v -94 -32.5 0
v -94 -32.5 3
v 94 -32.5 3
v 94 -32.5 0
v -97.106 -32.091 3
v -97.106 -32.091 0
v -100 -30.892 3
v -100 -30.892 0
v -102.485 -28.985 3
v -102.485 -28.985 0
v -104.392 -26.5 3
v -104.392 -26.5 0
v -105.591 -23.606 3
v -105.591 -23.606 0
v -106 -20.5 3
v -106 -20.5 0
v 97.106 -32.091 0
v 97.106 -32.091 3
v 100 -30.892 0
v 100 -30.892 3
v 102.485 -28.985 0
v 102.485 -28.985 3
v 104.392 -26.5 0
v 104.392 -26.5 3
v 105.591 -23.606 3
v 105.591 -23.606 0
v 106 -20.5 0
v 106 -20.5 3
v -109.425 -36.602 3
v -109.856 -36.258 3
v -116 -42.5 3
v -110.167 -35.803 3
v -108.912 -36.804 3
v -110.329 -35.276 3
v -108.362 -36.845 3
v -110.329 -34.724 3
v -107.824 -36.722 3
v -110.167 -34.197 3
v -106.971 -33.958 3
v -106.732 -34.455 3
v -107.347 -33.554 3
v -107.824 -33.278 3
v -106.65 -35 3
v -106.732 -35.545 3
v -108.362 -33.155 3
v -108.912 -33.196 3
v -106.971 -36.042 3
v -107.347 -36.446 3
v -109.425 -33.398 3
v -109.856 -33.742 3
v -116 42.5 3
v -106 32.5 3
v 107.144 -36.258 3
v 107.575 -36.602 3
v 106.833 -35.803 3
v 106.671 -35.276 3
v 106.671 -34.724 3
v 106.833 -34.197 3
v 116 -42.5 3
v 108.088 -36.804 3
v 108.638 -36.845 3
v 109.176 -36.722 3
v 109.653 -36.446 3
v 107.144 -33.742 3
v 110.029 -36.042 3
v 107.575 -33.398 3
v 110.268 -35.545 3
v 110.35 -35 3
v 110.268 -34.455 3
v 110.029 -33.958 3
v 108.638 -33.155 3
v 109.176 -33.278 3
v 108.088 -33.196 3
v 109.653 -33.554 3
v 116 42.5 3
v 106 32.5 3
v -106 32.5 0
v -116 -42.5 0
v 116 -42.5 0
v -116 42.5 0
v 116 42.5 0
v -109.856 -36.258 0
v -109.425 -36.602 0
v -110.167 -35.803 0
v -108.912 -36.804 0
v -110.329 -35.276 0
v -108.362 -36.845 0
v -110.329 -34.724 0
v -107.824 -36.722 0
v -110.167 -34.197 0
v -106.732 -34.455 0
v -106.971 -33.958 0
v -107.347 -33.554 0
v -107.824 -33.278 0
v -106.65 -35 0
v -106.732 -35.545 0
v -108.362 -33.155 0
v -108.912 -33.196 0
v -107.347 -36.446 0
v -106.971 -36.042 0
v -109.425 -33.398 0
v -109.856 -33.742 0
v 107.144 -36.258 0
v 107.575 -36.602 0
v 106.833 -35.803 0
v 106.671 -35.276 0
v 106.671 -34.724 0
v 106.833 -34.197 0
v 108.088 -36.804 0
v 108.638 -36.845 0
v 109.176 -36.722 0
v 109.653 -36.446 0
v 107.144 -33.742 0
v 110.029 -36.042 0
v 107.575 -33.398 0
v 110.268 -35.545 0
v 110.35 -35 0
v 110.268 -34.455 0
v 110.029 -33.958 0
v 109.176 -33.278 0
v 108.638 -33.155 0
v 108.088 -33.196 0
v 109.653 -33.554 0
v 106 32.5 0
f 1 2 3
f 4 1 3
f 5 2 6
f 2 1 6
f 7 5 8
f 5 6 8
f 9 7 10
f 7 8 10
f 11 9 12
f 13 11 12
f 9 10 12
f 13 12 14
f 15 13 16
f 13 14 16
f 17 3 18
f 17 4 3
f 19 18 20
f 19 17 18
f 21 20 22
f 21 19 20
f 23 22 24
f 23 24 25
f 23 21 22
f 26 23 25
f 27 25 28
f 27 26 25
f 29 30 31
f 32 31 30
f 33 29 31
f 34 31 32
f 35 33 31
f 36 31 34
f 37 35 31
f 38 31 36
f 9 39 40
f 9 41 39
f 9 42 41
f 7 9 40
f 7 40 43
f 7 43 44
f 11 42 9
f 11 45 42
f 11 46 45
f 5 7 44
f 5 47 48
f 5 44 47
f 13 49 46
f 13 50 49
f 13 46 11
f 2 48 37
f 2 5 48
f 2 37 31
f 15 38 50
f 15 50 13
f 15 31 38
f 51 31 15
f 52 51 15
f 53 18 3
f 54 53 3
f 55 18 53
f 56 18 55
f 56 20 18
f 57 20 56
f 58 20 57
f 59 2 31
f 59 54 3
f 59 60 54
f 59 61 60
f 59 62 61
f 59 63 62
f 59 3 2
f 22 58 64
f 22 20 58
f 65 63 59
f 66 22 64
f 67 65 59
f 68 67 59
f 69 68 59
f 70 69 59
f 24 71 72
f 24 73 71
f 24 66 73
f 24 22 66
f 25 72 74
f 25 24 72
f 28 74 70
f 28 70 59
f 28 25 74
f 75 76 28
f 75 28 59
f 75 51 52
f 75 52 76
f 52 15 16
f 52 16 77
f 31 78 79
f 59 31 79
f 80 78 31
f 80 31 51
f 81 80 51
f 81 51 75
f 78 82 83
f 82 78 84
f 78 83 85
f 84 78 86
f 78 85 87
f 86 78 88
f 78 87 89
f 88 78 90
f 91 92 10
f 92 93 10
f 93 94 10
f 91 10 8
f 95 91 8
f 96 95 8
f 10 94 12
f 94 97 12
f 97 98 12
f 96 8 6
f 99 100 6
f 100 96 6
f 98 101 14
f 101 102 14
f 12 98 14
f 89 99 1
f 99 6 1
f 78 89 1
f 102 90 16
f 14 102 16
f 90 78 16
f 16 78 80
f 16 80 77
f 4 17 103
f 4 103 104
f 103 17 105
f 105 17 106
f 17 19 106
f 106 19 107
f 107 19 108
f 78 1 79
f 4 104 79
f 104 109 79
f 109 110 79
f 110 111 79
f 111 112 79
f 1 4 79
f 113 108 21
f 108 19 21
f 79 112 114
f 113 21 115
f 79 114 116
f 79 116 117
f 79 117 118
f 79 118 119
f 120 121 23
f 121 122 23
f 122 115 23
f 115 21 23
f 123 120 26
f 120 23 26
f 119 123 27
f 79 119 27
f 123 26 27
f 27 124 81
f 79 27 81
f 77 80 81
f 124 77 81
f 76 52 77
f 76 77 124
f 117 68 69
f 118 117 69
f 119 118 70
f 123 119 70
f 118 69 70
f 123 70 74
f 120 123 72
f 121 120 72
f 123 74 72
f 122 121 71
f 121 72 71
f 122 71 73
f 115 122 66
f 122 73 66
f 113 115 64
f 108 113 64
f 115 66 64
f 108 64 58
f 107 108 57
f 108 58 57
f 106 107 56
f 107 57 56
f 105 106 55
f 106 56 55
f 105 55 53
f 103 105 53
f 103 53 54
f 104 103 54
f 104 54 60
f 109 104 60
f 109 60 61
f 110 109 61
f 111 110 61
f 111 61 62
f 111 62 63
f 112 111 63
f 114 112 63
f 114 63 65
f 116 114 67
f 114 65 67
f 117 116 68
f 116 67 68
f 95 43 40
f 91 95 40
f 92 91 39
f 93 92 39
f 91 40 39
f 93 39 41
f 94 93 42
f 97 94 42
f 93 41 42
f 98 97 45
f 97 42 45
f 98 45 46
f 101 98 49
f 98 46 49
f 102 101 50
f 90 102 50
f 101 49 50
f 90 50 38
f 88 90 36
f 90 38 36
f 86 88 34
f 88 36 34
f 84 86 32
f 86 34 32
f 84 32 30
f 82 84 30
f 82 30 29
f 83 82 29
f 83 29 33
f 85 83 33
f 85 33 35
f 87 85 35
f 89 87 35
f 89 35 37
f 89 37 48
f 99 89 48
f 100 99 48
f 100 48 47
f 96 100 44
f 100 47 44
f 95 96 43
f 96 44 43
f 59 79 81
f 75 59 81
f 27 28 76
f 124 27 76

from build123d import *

# Parameters (mm, degrees)
F0_W     = 232
F0_H     = 85
F2_DEPTH = 3
F3_W     = 212
F3_H     = 65
F4_DEPTH = 3
F5_R     = 12
F6_R     = 1.85
F7_DEPTH = 3


# Not quite as in the source:
# - a feature names something its author has since deleted; it is built from what else it names


with BuildPart() as f2:
    # F0 (on Top) → F2 (new body)
    with BuildSketch(Plane.XY):
        Rectangle(F0_W, F0_H)
    extrude(amount=F2_DEPTH)

    # F3 (on face) → F4 (cut)
    with BuildSketch(Plane.XY.offset(3)):
        Rectangle(F3_W, F3_H)
    extrude(amount=-F4_DEPTH, mode=Mode.SUBTRACT)

    # F5
    f5_edges = [f2.edges().sort_by_distance(p)[0] for p in [
        (-106, -32.5, 1.5),
        (106, -32.5, 1.5),
    ]]
    fillet(f5_edges, radius=F5_R)

    # F6 (on face) → F7 (cut)
    with BuildSketch(Plane.XY.offset(3)):
        with Locations((-108.5, -35)):
            Circle(F6_R)
        with Locations((108.5, -35)):
            Circle(F6_R)
    extrude(amount=-F7_DEPTH, mode=Mode.SUBTRACT)


solid = f2.part
